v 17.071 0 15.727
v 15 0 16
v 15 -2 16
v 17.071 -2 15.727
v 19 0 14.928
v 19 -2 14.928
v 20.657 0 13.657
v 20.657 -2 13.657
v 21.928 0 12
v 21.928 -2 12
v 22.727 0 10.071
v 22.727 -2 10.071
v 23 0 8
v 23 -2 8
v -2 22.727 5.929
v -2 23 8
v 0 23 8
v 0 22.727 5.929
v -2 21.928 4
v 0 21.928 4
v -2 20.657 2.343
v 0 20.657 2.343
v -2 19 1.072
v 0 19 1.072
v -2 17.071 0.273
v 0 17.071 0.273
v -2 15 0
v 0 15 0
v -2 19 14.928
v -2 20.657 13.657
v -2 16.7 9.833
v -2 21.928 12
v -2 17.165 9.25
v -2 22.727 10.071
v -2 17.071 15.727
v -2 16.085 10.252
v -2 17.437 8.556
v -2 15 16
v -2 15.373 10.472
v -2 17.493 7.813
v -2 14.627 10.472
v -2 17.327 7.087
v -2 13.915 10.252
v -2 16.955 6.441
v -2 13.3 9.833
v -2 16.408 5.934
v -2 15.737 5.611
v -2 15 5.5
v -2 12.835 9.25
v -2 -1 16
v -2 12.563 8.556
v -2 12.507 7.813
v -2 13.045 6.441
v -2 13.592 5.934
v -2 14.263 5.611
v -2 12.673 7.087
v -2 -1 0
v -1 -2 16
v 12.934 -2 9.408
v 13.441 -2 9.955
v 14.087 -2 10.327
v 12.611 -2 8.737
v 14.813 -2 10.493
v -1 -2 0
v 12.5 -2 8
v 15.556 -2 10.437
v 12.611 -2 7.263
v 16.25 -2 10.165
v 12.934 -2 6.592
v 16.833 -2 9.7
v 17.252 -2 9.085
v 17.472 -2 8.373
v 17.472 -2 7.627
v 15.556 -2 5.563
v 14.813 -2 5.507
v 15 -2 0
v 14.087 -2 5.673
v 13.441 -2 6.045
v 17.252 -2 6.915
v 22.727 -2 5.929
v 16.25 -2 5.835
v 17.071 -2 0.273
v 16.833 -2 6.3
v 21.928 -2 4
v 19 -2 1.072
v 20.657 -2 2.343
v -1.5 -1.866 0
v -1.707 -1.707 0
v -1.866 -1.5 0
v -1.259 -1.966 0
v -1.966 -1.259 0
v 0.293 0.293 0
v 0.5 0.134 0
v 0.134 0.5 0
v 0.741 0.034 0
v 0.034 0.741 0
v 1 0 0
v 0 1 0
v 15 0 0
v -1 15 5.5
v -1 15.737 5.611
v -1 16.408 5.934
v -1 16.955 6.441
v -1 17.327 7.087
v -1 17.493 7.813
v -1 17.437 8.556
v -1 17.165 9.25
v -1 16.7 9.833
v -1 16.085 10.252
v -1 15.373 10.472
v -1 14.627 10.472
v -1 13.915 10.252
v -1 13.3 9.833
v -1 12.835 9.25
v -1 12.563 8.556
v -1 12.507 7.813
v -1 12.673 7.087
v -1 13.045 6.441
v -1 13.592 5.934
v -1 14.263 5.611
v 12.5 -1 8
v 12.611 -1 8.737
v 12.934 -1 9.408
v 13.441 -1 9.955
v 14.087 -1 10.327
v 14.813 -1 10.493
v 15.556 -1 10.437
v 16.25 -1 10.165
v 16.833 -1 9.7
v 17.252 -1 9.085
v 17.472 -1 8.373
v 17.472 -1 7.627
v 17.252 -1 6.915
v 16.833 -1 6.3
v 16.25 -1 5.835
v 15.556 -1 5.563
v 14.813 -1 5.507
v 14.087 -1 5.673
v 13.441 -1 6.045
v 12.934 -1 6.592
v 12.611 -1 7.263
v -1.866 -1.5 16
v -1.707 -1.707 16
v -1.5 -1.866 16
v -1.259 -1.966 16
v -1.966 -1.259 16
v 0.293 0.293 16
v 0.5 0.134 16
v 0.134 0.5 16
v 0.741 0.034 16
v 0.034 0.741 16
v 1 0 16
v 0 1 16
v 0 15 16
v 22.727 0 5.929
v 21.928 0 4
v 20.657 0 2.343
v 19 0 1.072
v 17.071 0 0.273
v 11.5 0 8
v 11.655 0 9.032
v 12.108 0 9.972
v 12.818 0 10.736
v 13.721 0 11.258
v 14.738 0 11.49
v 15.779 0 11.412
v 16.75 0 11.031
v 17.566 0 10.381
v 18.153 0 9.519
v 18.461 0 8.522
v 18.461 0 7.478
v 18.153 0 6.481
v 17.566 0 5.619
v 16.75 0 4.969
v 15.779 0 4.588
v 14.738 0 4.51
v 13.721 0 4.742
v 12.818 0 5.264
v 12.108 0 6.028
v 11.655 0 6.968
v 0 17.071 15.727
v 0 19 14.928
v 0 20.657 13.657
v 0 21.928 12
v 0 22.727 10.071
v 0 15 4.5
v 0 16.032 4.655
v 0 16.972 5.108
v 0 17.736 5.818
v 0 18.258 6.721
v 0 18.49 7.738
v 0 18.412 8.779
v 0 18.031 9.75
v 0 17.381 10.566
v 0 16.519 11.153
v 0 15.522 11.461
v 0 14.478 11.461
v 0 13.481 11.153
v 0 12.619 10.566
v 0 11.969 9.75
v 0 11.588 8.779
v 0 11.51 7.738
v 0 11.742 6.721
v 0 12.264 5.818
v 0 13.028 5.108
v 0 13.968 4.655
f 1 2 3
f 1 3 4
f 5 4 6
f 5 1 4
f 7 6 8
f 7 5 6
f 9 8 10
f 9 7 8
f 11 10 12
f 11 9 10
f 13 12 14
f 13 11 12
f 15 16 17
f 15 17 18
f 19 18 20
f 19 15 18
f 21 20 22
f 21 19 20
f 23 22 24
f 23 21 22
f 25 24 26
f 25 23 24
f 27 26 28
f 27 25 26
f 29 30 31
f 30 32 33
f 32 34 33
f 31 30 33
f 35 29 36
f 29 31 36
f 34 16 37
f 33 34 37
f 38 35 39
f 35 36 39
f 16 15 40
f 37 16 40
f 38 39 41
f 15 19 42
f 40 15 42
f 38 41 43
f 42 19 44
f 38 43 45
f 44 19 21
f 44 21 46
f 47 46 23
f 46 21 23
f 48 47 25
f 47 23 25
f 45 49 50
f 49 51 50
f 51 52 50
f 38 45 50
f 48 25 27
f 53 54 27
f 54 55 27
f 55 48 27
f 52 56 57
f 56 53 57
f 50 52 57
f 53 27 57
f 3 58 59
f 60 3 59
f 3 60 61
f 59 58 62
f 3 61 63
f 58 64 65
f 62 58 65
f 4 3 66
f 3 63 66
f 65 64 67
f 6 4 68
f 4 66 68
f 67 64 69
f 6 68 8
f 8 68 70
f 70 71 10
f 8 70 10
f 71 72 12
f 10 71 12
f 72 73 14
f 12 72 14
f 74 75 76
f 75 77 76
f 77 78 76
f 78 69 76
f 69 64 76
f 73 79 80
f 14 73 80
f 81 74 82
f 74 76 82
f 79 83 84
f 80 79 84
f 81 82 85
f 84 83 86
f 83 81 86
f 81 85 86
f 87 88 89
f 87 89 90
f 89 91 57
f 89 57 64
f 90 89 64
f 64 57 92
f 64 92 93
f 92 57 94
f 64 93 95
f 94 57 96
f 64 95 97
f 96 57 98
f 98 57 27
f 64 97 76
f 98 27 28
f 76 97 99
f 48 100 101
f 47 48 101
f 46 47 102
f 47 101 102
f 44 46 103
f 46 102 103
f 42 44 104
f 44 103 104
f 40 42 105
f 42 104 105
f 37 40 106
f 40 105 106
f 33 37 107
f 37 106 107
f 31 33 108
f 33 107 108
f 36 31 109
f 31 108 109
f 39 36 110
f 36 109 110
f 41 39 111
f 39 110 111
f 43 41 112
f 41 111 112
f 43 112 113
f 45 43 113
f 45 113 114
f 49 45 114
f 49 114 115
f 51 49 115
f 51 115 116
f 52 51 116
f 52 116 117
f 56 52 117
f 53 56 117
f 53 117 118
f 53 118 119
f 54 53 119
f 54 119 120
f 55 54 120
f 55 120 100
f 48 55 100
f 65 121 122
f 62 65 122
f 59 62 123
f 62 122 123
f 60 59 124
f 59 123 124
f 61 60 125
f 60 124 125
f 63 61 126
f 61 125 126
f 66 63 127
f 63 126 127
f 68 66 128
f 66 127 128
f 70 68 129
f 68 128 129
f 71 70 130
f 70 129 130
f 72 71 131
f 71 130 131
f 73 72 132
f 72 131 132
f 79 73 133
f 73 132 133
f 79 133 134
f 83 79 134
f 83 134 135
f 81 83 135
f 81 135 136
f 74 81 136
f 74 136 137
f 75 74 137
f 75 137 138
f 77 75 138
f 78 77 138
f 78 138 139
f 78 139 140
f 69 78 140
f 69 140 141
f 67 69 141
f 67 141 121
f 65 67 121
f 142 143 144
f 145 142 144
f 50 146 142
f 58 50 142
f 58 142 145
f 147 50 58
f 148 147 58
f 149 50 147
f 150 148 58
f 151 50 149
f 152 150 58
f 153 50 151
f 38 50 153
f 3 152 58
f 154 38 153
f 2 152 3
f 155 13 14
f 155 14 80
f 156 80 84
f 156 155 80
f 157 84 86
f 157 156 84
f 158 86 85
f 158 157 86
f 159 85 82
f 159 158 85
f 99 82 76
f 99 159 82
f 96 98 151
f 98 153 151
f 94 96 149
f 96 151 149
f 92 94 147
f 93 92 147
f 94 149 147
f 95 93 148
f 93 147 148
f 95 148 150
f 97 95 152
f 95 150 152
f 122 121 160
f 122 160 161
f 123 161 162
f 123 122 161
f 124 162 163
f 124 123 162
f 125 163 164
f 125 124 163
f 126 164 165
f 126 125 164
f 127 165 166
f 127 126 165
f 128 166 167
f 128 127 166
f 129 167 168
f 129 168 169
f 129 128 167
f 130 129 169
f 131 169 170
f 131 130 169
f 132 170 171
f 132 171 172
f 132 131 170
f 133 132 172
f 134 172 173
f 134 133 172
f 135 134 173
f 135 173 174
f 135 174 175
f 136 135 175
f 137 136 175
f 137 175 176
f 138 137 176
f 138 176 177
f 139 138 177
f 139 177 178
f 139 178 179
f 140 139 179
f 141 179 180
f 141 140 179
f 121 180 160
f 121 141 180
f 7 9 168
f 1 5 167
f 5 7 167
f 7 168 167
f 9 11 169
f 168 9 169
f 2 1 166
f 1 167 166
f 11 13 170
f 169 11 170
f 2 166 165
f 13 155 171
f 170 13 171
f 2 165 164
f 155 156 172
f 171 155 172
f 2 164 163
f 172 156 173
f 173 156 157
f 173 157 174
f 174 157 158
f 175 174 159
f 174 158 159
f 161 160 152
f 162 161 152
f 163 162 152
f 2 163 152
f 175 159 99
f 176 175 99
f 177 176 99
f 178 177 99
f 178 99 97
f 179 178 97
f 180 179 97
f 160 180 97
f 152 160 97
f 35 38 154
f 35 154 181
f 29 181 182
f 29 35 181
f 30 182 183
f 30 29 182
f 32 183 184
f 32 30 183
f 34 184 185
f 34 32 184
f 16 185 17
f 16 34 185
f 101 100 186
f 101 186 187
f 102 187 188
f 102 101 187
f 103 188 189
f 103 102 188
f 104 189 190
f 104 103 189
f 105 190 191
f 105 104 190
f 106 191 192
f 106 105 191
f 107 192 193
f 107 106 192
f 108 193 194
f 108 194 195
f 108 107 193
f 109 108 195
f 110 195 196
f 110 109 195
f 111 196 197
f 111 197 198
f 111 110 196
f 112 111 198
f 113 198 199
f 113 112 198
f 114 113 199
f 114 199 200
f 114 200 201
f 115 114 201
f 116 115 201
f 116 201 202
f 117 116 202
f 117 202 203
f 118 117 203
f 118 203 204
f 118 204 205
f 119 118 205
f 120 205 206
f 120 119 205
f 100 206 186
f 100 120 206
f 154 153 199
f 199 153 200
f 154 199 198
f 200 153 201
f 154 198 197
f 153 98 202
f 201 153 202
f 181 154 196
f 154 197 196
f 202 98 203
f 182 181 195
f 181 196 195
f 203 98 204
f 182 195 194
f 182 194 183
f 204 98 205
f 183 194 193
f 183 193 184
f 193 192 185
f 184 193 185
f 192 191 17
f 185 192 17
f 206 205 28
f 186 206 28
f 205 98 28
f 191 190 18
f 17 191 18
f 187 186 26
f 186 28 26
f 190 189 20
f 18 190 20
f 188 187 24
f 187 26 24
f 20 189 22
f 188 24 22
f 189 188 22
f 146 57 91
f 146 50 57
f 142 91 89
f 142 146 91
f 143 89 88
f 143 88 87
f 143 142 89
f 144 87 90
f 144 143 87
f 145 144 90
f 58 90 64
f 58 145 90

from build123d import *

# Parameters (mm, degrees)
EXTRUDE_1_DEPTH          = 16
CUT_EXTRUDE_1_DEPTH      = 37.249137921
CUT_EXTRUDE_1_DEPTH_BACK = 16
CUT_EXTRUDE_2_DEPTH      = 38.549966711
CUT_EXTRUDE_2_DEPTH_BACK = 16
SKETCH_4_R               = 2.5
CUT_EXTRUDE_3_DEPTH      = 16
SKETCH_5_R               = 2.5
CUT_EXTRUDE_4_DEPTH      = 16
FILLET_1_R               = 1
FILLET_2_R               = 1
CHAMFER_1_SIZE           = 1
CHAMFER_2_SIZE           = 1


with BuildPart() as part:
    # 草图1 → 凸台-拉伸1 (new body)
    with BuildSketch(Plane.XY):
        Polygon((0, 0), (0, 23), (-2, 23), (-2, -2), (23, -2), (23, 0), align=None)
    extrude(amount=EXTRUDE_1_DEPTH)

    # 草图2 → 切除-拉伸1 (cut, two sides: drawn at the far end of the back side and taken through both)
    with BuildSketch(Plane(origin=(0, 0, 0), x_dir=(0, 0, -1), z_dir=(1, 0, 0)).offset(-CUT_EXTRUDE_1_DEPTH_BACK)):
        with BuildLine():
            ThreePointArc((-16, 15), (-13.656854249, 20.656854249), (-8, 23))
            Line((-8, 23), (-16, 23))
            Line((-16, 23), (-16, 15))
        make_face()
        with BuildLine():
            ThreePointArc((-8, 23), (-2.343145751, 20.656854249), (0, 15))
            Line((0, 15), (0, 23))
            Line((0, 23), (-8, 23))
        make_face()
    extrude(amount=CUT_EXTRUDE_1_DEPTH + CUT_EXTRUDE_1_DEPTH_BACK, mode=Mode.SUBTRACT)

    # 草图3 → 切除-拉伸2 (cut, two sides: drawn at the far end of the back side and taken through both)
    with BuildSketch(Plane.XZ.offset(2).offset(-CUT_EXTRUDE_2_DEPTH_BACK)):
        with BuildLine():
            ThreePointArc((23, 8), (20.656854249, 2.343145751), (15, 0))
            Line((15, 0), (23, 0))
            Line((23, 0), (23, 8))
        make_face()
        with BuildLine():
            ThreePointArc((15, 16), (20.656854249, 13.656854249), (23, 8))
            Line((23, 8), (23, 16))
            Line((23, 16), (15, 16))
        make_face()
    extrude(amount=CUT_EXTRUDE_2_DEPTH + CUT_EXTRUDE_2_DEPTH_BACK, mode=Mode.SUBTRACT)

    # 草图4 → 切除-拉伸3 (cut)
    with BuildSketch(Plane(origin=(0, 0, 0), x_dir=(1, 0, 0), z_dir=(0, 1, 0))):
        with Locations(Location((15, -8, 0), (0, 0, 180))):
            Circle(SKETCH_4_R)
    extrude(amount=-CUT_EXTRUDE_3_DEPTH, mode=Mode.SUBTRACT)

    # 草图5 → 切除-拉伸4 (cut)
    with BuildSketch(Plane(origin=(0, 0, 0), x_dir=(0, 0, -1), z_dir=(1, 0, 0))):
        with Locations((-8, 15)):
            Circle(SKETCH_5_R)
    extrude(amount=-CUT_EXTRUDE_4_DEPTH, mode=Mode.SUBTRACT)

    # 圆角1
    fillet_1_edges = [part.edges().sort_by_distance(p)[0] for p in [
        (0, 0, 8),
    ]]
    fillet(fillet_1_edges, radius=FILLET_1_R)

    # 圆角2
    fillet_2_edges = [part.edges().sort_by_distance(p)[0] for p in [
        (-2, -2, 8),
    ]]
    fillet(fillet_2_edges, radius=FILLET_2_R)

    # 倒角1
    chamfer_1_edges = [part.edges().sort_by_distance(p)[0] for p in [
        (0, 15, 10.5),
    ]]
    chamfer(chamfer_1_edges, length=CHAMFER_1_SIZE)

    # 倒角2
    chamfer_2_edges = [part.edges().sort_by_distance(p)[0] for p in [
        (17.5, 0, 8),
    ]]
    chamfer(chamfer_2_edges, length=CHAMFER_2_SIZE)


solid = part.part
